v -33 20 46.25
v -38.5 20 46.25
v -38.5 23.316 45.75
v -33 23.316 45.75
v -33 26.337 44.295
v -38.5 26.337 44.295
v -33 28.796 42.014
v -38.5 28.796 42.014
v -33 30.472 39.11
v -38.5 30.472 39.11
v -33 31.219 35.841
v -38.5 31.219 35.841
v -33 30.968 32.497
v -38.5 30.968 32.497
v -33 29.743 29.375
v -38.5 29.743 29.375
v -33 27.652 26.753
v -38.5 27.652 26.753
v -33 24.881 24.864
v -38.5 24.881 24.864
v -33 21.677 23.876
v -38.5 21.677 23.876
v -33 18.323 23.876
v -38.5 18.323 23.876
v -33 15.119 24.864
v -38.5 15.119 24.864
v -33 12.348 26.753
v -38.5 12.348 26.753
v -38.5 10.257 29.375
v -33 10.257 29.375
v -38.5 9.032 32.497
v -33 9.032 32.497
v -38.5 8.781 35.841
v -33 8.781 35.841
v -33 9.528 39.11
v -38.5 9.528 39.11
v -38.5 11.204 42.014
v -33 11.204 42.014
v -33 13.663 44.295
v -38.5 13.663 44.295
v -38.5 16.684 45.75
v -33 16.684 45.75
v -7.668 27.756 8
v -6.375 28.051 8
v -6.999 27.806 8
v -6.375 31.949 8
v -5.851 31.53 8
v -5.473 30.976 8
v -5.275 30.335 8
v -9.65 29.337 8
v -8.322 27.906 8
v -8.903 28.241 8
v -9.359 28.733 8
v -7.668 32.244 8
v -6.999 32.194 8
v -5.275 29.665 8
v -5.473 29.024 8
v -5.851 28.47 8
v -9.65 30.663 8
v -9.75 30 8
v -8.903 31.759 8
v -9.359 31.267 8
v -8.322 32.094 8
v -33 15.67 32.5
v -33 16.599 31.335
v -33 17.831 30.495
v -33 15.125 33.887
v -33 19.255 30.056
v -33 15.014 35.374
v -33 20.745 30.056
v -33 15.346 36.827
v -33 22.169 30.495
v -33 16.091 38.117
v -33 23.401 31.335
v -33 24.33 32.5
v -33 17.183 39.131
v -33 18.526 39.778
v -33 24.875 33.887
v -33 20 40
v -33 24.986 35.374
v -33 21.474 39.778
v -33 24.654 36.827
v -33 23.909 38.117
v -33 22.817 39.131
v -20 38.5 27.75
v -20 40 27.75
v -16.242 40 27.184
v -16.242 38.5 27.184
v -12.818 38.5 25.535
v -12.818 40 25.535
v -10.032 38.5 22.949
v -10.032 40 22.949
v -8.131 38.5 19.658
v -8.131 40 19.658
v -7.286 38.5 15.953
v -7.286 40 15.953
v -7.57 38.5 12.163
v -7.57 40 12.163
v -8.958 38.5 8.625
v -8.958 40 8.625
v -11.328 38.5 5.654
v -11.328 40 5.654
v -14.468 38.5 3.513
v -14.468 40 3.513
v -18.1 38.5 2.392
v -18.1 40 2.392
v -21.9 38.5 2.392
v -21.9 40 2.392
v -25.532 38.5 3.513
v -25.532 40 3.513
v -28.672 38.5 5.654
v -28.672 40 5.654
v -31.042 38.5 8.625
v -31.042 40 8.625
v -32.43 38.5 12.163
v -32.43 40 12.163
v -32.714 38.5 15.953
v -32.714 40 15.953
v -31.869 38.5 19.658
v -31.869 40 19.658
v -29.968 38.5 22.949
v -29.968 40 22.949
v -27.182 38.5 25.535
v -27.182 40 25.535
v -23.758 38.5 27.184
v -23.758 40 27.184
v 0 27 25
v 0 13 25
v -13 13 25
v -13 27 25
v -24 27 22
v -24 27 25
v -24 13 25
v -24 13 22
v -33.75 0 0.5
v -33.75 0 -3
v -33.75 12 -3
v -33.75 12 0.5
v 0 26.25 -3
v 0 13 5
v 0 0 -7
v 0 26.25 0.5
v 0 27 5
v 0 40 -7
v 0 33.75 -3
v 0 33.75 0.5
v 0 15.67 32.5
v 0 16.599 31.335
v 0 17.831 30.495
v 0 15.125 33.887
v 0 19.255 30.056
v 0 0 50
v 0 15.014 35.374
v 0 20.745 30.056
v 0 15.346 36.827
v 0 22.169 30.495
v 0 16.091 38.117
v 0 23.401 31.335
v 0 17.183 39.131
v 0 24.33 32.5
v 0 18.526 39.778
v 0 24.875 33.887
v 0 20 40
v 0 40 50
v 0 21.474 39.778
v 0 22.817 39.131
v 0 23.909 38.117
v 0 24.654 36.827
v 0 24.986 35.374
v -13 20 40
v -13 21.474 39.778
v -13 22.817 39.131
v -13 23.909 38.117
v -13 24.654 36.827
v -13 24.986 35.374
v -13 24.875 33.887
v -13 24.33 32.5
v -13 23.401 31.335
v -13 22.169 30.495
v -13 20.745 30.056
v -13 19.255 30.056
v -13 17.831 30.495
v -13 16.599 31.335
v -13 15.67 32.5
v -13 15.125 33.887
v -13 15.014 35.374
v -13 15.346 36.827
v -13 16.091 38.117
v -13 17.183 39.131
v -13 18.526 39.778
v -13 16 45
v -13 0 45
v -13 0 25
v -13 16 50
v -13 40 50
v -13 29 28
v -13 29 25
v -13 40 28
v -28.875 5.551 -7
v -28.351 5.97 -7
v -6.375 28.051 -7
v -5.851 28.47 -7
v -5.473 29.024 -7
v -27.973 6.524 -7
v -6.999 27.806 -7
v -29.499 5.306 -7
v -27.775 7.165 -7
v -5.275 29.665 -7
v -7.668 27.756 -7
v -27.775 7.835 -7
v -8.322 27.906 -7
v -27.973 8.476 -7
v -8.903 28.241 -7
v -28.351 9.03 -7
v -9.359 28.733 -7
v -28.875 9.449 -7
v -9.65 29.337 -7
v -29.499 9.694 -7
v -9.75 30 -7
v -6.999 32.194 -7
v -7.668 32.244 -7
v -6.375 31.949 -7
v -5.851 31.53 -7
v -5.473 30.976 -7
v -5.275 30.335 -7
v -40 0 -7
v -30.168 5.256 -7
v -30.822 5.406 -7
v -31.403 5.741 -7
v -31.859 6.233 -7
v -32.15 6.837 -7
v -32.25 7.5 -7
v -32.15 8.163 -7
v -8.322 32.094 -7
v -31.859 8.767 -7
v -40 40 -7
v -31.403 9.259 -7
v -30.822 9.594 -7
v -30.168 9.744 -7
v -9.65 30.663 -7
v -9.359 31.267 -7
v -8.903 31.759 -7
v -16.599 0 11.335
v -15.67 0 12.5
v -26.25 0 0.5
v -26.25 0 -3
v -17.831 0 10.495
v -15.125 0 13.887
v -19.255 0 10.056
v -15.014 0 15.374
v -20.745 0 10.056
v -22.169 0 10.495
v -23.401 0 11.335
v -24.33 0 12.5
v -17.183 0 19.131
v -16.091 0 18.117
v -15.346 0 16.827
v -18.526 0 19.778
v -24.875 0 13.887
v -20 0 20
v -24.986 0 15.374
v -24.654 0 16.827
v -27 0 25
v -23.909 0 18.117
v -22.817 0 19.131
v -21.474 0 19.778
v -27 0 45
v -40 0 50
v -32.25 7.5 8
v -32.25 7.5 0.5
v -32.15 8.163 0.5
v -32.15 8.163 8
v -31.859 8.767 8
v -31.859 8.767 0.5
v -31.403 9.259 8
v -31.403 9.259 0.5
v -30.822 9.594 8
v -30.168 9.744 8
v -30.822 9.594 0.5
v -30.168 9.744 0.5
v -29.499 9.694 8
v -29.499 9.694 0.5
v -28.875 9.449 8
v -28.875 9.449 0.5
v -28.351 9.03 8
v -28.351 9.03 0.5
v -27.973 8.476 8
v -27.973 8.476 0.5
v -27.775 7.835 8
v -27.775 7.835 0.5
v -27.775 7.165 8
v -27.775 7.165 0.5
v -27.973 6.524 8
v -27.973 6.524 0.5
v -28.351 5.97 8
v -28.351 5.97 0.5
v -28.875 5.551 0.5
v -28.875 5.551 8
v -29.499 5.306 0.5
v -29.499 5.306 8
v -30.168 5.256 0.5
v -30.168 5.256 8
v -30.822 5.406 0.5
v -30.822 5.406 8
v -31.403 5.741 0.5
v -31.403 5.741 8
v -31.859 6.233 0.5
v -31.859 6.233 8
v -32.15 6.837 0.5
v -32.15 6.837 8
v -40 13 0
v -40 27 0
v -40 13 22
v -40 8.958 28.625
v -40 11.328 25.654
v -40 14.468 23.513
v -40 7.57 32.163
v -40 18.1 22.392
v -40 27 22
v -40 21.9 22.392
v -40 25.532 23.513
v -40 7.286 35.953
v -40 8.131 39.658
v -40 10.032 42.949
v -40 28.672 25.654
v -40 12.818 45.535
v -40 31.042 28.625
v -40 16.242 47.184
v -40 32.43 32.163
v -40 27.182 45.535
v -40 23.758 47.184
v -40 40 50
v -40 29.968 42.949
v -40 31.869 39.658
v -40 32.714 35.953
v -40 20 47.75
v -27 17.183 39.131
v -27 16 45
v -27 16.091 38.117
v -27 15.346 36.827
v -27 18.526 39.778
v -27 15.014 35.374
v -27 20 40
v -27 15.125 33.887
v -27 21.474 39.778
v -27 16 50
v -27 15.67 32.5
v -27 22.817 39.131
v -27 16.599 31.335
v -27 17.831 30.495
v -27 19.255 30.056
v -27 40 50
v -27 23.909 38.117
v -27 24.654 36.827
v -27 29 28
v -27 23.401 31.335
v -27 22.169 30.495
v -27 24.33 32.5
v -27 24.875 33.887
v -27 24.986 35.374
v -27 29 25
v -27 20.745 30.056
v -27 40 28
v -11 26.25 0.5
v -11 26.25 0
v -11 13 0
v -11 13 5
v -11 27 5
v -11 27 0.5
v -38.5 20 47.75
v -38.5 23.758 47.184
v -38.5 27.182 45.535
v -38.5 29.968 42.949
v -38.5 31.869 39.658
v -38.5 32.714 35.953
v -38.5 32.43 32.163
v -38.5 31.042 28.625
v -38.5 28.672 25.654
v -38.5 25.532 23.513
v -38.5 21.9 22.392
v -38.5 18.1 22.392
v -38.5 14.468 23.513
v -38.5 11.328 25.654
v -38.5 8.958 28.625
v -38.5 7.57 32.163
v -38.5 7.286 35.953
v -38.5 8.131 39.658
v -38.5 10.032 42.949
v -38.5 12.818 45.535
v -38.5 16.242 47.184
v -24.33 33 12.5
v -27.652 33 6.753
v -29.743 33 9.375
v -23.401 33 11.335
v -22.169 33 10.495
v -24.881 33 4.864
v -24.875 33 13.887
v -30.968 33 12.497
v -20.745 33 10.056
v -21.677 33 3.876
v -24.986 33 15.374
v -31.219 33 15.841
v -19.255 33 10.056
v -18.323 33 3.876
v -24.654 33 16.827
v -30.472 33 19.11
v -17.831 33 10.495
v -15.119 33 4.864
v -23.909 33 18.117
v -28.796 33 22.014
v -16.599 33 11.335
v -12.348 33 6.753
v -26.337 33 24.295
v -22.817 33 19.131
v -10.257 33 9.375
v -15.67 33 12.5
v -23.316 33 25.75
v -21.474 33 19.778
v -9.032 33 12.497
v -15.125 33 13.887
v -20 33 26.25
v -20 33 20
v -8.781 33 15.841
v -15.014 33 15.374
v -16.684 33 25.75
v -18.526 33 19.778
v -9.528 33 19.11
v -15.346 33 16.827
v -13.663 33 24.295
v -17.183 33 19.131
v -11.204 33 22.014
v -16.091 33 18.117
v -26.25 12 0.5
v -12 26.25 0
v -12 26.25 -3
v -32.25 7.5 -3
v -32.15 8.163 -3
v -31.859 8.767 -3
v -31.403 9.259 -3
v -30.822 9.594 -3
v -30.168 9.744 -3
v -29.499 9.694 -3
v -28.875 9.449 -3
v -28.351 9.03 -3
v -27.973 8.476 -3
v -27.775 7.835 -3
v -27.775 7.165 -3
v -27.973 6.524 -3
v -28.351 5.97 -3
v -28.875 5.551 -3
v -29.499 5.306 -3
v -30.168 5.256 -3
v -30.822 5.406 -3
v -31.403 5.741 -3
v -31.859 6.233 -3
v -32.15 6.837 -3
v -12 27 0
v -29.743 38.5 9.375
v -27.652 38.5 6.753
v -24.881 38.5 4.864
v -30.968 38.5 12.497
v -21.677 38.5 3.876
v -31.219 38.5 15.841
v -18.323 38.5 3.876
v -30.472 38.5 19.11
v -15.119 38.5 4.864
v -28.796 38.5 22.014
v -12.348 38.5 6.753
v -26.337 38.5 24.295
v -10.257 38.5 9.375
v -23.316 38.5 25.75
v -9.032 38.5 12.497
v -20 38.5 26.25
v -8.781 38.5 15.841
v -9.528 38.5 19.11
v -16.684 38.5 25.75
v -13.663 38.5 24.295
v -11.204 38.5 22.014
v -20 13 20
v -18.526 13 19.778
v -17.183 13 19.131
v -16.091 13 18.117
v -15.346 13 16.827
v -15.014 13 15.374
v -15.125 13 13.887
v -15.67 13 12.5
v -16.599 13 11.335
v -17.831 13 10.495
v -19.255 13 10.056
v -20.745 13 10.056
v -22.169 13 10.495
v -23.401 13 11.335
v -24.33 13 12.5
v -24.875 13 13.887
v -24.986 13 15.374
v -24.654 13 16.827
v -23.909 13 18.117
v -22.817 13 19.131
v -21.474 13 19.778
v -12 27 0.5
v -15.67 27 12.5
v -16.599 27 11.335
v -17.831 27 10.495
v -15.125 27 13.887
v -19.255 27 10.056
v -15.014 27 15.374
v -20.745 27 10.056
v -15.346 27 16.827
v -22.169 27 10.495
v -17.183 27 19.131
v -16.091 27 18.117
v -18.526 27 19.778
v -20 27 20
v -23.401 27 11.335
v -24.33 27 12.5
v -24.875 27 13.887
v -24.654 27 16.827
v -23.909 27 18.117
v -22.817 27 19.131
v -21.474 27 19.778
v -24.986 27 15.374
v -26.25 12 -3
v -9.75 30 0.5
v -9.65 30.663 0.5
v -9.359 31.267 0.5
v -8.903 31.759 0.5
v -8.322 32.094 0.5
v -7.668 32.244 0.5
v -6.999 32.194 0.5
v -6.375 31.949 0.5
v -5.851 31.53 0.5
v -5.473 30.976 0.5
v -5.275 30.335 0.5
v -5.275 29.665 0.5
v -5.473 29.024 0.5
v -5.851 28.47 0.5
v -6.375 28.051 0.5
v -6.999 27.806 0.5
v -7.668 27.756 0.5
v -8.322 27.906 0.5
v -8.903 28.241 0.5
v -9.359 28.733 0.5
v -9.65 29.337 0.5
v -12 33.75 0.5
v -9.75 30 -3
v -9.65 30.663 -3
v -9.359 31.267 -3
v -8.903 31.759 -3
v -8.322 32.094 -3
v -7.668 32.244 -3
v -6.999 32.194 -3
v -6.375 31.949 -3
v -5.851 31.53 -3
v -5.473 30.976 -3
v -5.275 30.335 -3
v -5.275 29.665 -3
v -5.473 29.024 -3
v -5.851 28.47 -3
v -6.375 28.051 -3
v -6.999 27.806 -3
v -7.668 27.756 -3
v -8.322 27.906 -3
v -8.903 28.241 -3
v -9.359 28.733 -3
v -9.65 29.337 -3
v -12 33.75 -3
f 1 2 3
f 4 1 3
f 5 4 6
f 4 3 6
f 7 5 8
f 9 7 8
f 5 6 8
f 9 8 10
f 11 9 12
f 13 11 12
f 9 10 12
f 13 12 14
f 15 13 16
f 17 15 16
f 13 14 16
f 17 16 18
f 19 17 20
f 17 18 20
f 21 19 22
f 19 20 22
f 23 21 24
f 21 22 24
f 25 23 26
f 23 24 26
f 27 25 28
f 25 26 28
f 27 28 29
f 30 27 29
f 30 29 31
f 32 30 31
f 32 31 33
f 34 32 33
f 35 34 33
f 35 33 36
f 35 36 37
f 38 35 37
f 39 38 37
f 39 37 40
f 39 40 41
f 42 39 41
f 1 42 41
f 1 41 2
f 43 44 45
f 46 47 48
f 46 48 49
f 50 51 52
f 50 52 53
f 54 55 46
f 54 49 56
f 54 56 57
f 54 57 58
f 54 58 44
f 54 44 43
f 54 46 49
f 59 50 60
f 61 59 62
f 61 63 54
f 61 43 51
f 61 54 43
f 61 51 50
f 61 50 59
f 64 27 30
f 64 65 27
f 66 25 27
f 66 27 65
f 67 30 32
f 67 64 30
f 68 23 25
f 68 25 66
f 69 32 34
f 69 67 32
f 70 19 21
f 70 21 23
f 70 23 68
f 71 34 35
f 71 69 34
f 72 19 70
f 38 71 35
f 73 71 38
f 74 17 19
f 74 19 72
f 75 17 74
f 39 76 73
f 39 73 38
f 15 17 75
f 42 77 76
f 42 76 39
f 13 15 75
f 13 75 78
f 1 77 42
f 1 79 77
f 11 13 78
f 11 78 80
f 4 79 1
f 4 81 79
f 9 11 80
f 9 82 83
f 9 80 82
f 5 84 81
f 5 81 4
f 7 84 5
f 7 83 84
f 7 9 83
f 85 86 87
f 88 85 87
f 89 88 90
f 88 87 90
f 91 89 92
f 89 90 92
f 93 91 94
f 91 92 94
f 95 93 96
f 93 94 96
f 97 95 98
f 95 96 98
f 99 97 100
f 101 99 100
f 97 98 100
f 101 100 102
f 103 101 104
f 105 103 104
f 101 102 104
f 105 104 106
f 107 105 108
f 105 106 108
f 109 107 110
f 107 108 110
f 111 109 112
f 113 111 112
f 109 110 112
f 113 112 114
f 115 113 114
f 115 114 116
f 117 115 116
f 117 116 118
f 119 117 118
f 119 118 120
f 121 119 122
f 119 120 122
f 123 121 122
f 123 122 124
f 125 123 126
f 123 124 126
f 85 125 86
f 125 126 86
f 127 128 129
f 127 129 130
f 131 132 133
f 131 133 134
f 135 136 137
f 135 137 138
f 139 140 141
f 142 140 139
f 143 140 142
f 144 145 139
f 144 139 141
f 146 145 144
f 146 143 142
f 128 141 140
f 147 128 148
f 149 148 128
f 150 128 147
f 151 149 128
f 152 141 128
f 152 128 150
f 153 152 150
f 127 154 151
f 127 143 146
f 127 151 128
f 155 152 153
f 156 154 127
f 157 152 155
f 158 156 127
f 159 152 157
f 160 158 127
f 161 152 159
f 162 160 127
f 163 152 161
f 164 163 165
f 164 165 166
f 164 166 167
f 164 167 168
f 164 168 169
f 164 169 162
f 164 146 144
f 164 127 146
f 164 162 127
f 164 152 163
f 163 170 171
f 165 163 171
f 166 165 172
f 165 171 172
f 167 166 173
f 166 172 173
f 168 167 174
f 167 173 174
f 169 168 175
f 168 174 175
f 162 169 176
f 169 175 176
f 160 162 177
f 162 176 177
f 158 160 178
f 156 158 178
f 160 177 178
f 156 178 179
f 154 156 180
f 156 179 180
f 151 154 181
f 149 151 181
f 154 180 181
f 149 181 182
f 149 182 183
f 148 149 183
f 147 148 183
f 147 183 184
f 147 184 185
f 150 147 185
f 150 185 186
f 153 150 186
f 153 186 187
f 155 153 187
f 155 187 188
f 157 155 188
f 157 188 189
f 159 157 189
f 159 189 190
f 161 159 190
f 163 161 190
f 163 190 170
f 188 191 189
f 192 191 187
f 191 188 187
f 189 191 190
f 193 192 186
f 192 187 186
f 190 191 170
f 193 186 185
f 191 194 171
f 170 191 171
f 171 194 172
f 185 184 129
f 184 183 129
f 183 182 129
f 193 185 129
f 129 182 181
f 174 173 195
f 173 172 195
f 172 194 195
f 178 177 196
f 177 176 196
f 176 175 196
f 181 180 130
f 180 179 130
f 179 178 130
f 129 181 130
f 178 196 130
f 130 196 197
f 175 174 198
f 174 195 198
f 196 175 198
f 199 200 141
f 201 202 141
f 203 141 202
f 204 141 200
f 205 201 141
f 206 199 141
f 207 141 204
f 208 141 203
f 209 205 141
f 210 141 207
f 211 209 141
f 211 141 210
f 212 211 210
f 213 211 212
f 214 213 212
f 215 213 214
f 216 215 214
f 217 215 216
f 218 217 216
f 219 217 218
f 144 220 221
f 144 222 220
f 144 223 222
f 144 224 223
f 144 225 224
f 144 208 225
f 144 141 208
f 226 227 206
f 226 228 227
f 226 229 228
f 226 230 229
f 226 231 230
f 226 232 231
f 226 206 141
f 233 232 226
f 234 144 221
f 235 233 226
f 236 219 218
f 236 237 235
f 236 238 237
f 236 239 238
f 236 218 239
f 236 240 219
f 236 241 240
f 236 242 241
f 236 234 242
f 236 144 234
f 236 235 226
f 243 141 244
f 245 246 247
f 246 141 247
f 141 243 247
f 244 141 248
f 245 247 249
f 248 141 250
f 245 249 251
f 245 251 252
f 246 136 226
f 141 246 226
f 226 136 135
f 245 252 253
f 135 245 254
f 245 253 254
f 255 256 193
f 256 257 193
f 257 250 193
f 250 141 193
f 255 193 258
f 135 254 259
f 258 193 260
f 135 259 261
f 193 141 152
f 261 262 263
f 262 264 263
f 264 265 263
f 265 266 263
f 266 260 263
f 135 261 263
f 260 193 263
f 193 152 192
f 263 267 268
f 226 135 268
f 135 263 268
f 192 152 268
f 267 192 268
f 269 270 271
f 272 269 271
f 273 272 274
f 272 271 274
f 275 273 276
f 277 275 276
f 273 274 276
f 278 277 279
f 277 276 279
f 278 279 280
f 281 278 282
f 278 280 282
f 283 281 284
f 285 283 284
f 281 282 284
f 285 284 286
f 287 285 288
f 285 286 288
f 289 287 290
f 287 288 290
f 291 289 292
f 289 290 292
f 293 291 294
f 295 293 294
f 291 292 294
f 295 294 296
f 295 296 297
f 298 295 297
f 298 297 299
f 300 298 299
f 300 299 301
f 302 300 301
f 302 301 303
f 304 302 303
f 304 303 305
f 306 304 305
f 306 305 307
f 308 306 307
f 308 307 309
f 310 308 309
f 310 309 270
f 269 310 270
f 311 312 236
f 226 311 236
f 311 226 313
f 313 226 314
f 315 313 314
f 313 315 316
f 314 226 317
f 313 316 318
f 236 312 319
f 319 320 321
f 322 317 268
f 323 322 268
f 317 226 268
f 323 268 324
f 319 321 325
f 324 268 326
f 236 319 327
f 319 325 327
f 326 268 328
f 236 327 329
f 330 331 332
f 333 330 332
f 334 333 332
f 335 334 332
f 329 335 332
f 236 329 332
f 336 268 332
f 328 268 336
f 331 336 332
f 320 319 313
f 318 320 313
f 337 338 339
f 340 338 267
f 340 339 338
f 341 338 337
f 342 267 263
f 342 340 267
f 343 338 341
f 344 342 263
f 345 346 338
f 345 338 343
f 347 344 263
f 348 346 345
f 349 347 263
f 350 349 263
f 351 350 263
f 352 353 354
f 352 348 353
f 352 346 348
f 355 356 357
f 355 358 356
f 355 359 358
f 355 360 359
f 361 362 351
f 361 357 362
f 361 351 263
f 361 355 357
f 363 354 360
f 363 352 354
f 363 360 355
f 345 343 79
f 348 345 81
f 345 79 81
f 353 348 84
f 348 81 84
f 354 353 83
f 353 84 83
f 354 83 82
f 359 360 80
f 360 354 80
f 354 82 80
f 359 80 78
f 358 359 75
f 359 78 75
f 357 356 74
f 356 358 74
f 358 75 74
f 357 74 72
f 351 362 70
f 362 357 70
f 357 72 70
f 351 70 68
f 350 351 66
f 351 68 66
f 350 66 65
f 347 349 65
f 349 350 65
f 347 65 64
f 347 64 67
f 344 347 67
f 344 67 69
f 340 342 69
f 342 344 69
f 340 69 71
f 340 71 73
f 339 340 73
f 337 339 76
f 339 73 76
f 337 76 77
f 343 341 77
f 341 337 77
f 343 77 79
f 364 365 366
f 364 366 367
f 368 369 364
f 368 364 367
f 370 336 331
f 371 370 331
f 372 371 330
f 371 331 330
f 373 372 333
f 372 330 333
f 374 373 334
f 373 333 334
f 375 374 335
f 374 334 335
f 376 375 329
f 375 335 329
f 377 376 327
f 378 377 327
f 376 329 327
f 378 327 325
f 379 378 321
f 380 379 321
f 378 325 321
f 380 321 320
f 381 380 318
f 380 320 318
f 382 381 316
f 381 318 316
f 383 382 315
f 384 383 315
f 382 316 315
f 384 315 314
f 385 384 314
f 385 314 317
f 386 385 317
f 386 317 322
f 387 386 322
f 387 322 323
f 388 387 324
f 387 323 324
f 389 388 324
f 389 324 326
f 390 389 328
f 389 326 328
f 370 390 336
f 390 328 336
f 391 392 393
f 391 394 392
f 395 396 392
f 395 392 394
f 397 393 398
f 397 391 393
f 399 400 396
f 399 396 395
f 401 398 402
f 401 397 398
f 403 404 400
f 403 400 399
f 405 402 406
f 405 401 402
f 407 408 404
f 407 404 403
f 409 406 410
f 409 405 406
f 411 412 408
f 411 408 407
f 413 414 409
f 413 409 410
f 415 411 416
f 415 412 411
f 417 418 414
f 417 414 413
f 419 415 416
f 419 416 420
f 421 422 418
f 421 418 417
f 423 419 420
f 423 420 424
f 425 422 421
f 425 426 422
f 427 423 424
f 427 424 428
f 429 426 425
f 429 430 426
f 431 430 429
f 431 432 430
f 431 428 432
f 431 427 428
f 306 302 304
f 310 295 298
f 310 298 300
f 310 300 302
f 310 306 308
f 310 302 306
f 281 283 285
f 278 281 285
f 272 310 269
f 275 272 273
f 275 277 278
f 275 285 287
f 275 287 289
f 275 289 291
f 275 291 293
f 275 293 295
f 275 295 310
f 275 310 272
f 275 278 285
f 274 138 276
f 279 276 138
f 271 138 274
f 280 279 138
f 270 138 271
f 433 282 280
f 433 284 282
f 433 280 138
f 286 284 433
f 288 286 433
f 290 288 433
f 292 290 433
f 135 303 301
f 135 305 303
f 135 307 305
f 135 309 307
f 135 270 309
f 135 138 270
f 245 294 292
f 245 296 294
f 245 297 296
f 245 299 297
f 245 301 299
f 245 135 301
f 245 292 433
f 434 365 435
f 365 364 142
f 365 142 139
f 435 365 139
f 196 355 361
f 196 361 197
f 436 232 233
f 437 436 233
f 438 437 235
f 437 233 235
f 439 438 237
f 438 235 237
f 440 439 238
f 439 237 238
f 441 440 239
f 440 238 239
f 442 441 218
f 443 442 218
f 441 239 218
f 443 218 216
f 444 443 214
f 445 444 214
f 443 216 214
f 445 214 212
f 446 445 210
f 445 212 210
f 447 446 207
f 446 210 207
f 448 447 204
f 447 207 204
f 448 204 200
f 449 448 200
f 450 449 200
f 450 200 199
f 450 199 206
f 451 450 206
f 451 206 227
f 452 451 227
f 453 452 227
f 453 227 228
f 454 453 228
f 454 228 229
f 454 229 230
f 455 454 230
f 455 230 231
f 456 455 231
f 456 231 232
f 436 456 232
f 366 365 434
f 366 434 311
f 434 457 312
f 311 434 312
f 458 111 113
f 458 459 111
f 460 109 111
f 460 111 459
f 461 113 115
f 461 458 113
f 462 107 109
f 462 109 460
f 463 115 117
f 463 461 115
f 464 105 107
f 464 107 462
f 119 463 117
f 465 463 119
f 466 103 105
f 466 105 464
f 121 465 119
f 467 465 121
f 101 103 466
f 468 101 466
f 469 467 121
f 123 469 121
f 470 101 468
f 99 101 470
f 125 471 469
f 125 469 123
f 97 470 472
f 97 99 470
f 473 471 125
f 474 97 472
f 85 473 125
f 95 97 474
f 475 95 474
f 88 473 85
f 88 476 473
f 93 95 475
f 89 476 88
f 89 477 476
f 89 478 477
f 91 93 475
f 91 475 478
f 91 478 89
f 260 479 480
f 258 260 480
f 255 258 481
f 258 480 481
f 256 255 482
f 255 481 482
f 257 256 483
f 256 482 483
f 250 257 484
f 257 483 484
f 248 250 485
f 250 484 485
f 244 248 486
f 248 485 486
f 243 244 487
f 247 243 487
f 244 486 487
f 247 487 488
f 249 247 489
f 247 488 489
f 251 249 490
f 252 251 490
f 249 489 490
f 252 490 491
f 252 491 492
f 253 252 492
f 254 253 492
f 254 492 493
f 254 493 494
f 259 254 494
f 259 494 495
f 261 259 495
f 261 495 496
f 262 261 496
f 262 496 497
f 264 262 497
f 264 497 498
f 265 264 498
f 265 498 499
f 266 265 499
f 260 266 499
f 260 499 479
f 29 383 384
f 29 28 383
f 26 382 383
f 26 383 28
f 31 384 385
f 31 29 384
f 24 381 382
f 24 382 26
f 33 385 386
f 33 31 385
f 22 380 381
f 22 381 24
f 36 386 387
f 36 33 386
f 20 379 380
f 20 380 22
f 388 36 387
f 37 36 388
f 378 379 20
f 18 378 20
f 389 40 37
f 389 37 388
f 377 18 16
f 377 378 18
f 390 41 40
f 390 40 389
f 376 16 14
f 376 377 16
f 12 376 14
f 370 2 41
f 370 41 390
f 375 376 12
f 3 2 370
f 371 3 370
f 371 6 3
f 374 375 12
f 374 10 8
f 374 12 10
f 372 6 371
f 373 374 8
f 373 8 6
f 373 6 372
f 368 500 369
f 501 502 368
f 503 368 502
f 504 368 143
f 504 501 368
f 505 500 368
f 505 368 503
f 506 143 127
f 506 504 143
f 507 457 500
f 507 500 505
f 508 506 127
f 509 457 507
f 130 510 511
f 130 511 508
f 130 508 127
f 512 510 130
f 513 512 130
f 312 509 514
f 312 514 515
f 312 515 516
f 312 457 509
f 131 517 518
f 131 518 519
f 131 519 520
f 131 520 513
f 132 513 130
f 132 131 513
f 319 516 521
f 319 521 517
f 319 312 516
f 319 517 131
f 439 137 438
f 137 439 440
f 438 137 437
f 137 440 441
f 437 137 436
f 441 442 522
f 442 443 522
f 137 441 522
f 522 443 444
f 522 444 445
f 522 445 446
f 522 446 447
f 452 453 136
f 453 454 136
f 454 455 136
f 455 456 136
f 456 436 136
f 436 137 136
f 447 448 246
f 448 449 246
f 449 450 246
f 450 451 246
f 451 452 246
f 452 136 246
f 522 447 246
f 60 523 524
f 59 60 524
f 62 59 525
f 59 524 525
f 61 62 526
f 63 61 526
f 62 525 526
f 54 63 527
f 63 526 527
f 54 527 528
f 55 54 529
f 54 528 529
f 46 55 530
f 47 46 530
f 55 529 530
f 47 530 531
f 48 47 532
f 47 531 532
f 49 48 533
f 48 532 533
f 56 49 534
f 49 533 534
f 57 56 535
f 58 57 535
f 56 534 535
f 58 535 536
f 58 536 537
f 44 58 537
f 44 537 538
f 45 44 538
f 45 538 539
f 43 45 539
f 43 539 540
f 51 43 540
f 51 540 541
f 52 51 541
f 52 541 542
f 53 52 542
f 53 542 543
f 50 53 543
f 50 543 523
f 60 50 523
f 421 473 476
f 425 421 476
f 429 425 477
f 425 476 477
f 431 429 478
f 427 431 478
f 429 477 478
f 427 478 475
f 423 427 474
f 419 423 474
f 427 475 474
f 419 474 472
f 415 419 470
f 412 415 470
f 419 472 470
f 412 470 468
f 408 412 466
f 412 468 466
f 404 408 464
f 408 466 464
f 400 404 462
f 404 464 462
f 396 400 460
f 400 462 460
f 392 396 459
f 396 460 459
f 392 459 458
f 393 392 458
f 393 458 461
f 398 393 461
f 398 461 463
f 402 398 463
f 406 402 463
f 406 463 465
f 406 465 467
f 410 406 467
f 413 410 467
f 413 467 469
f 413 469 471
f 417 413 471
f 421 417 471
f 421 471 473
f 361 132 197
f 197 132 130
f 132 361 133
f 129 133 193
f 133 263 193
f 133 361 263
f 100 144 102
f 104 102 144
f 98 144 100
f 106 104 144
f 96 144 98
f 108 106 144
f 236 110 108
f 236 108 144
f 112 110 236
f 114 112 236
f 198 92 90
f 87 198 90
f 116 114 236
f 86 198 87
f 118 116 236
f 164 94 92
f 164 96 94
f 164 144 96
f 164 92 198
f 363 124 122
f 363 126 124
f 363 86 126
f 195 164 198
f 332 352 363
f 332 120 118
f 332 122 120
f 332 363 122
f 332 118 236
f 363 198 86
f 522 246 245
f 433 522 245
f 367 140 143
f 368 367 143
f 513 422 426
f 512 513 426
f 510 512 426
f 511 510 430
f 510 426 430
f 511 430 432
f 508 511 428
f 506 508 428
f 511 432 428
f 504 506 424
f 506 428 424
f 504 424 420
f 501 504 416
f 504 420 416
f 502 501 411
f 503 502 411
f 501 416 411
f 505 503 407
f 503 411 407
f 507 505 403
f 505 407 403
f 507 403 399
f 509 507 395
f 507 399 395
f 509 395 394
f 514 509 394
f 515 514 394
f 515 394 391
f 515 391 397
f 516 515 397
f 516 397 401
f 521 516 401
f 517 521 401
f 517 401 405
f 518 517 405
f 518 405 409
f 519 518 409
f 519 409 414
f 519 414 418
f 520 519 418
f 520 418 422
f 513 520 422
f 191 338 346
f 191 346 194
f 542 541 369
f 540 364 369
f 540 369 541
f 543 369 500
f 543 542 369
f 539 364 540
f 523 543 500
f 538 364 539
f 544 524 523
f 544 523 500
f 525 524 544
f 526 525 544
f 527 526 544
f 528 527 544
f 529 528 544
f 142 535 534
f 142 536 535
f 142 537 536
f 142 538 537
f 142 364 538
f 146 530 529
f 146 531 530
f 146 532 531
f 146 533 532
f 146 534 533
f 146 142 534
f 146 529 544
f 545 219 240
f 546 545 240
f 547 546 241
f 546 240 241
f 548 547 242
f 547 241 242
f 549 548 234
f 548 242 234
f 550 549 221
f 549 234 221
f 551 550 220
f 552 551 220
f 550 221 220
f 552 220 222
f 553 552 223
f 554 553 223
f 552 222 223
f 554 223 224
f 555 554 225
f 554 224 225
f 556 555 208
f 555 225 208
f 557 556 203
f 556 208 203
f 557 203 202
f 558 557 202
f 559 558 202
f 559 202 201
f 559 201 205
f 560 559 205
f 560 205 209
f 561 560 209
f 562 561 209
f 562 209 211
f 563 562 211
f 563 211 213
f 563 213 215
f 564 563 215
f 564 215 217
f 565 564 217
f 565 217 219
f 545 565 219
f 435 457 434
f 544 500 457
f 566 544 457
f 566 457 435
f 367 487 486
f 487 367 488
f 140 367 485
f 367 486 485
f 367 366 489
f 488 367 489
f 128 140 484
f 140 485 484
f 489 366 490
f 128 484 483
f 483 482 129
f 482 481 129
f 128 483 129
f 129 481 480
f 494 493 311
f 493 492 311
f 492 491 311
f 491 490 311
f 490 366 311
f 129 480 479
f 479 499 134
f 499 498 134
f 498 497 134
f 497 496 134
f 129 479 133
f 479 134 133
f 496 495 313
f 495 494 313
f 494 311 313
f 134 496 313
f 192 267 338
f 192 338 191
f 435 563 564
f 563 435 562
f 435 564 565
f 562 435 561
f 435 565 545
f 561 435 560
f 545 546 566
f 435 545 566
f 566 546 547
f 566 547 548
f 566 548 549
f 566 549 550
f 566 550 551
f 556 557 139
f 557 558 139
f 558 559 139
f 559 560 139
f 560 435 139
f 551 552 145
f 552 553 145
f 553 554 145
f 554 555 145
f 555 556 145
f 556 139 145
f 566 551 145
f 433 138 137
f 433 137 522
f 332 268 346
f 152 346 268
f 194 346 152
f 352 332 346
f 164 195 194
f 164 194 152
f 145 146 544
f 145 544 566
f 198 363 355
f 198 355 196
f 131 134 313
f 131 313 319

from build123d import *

# Parameters (mm, degrees)
ESQUISSE1_W              = 40
ESQUISSE1_H              = 40
BOSS_EXTRU_1_DEPTH       = 50
ESQUISSE2_R              = 5
ENL_V_MAT_EXTRU_1_DEPTH  = 41
ESQUISSE3_R              = 5
ENL_V_MAT_EXTRU_2_DEPTH  = 41
ESQUISSE4_W              = 22
ESQUISSE4_H              = 14
ENL_V_MAT_EXTRU_3_DEPTH  = 29
ESQUISSE5_W              = 14
ESQUISSE5_H              = 20
ENL_V_MAT_EXTRU_4_DEPTH  = 29
ESQUISSE6_W              = 20
ESQUISSE6_H              = 14
ENL_V_MAT_EXTRU_5_DEPTH  = 24
ESQUISSE7_W              = 14
ESQUISSE7_H              = 22
ENL_V_MAT_EXTRU_6_DEPTH  = 24
ESQUISSE10_R             = 11.25
ENL_V_MAT_EXTRU_9_DEPTH  = 7
ESQUISSE11_R             = 12.75
ENL_V_MAT_EXTRU_10_DEPTH = 1.5
ESQUISSE14_R             = 11.25
ENL_V_MAT_EXTRU_11_DEPTH = 7
ESQUISSE15_R             = 12.75
ENL_V_MAT_EXTRU_12_DEPTH = 1.5
ESQUISSE16_W             = 40
ESQUISSE16_H             = 40
BOSS_EXTRU_2_DEPTH       = 7
ESQUISSE17_R             = 2.25
ENL_V_MAT_EXTRU_13_DEPTH = 15
ESQUISSE18_W             = 3.5
ESQUISSE18_H             = 7.5
ENL_V_MAT_EXTRU_14_DEPTH = 12
ESQUISSE19_W             = 7.5
ESQUISSE19_H             = 3.5
ENL_V_MAT_EXTRU_15_DEPTH = 12


with BuildPart() as part:
    # Esquisse1 → Boss.-Extru.1 (new body)
    with BuildSketch(Plane.XY):
        with Locations((-20, 20)):
            Rectangle(ESQUISSE1_W, ESQUISSE1_H)
    extrude(amount=BOSS_EXTRU_1_DEPTH)

    # Esquisse2 → Enlèv. mat.-Extru.1 (cut, through all)
    with BuildSketch(Plane(origin=(0, 40, 0), x_dir=(1, 0, 0), z_dir=(0, 1, 0))):
        with Locations(Location((-20, -15, 0), (0, 0, 270))):  # turned: the seam where the file's is
            Circle(ESQUISSE2_R)
    extrude(amount=-ENL_V_MAT_EXTRU_1_DEPTH, mode=Mode.SUBTRACT)

    # Esquisse3 → Enlèv. mat.-Extru.2 (cut, through all)
    with BuildSketch(Plane.ZY.offset(40)):
        with Locations((35, 20)):
            Circle(ESQUISSE3_R)
    extrude(amount=-ENL_V_MAT_EXTRU_2_DEPTH, mode=Mode.SUBTRACT)

    # Esquisse4 → Enlèv. mat.-Extru.3 (cut)
    with BuildSketch(Plane.ZY.offset(40)):
        with Locations((11, 20)):
            Rectangle(ESQUISSE4_W, ESQUISSE4_H)
    extrude(amount=-ENL_V_MAT_EXTRU_3_DEPTH, mode=Mode.SUBTRACT)

    # Esquisse5 → Enlèv. mat.-Extru.4 (cut)
    with BuildSketch(Plane.XZ):
        with Locations((-20, 35)):
            Rectangle(ESQUISSE5_W, ESQUISSE5_H)
    extrude(amount=-ENL_V_MAT_EXTRU_4_DEPTH, mode=Mode.SUBTRACT)

    # Esquisse6 → Enlèv. mat.-Extru.5 (cut)
    with BuildSketch(Plane(origin=(0, 0, 0), x_dir=(0, 0, -1), z_dir=(1, 0, 0))):
        with Locations((-15, 20)):
            Rectangle(ESQUISSE6_W, ESQUISSE6_H)
    extrude(amount=-ENL_V_MAT_EXTRU_5_DEPTH, mode=Mode.SUBTRACT)

    # Esquisse7 → Enlèv. mat.-Extru.6 (cut)
    with BuildSketch(Plane(origin=(0, 40, 0), x_dir=(1, 0, 0), z_dir=(0, 1, 0))):
        with Locations((-20, -39)):
            Rectangle(ESQUISSE7_W, ESQUISSE7_H)
    extrude(amount=-ENL_V_MAT_EXTRU_6_DEPTH, mode=Mode.SUBTRACT)

    # Esquisse10 → Enlèv. mat.-Extru.9 (cut)
    with BuildSketch(Plane(origin=(0, 40, 0), x_dir=(1, 0, 0), z_dir=(0, 1, 0))):
        with Locations(Location((-20, -15, 0), (0, 0, 270))):  # turned: the seam where the file's is
            Circle(ESQUISSE10_R)
    extrude(amount=-ENL_V_MAT_EXTRU_9_DEPTH, mode=Mode.SUBTRACT)

    # Esquisse11 → Enlèv. mat.-Extru.10 (cut)
    with BuildSketch(Plane(origin=(0, 40, 0), x_dir=(1, 0, 0), z_dir=(0, 1, 0))):
        with Locations(Location((-20, -15, 0), (0, 0, 270))):  # turned: the seam where the file's is
            Circle(ESQUISSE11_R)
    extrude(amount=-ENL_V_MAT_EXTRU_10_DEPTH, mode=Mode.SUBTRACT)

    # Esquisse14 → Enlèv. mat.-Extru.11 (cut)
    with BuildSketch(Plane.ZY.offset(40)):
        with Locations((35, 20)):
            Circle(ESQUISSE14_R)
    extrude(amount=-ENL_V_MAT_EXTRU_11_DEPTH, mode=Mode.SUBTRACT)

    # Esquisse15 → Enlèv. mat.-Extru.12 (cut)
    with BuildSketch(Plane.ZY.offset(40)):
        with Locations((35, 20)):
            Circle(ESQUISSE15_R)
    extrude(amount=-ENL_V_MAT_EXTRU_12_DEPTH, mode=Mode.SUBTRACT)

    # Esquisse16 → Boss.-Extru.2 (add)
    with BuildSketch(Plane(origin=(0, 0, 0), x_dir=(-1, 0, 0), z_dir=(0, 0, -1))):
        with Locations((20, 20)):
            Rectangle(ESQUISSE16_W, ESQUISSE16_H)
    extrude(amount=BOSS_EXTRU_2_DEPTH)

    # Esquisse17 → Enlèv. mat.-Extru.13 (cut)
    with BuildSketch(Plane(origin=(0, 0, -7), x_dir=(-1, 0, 0), z_dir=(0, 0, -1))):
        with Locations((7.5, 30)):
            Circle(ESQUISSE17_R)
        with Locations((30, 7.5)):
            Circle(ESQUISSE17_R)
    extrude(amount=-ENL_V_MAT_EXTRU_13_DEPTH, mode=Mode.SUBTRACT)

    # Esquisse18 → Enlèv. mat.-Extru.14 (cut)
    with BuildSketch(Plane(origin=(0, 0, 0), x_dir=(0, 0, -1), z_dir=(1, 0, 0))):
        with Locations((1.25, 30)):
            Rectangle(ESQUISSE18_W, ESQUISSE18_H)
    extrude(amount=-ENL_V_MAT_EXTRU_14_DEPTH, mode=Mode.SUBTRACT)

    # Esquisse19 → Enlèv. mat.-Extru.15 (cut)
    with BuildSketch(Plane.XZ):
        with Locations((-30, -1.25)):
            Rectangle(ESQUISSE19_W, ESQUISSE19_H)
    extrude(amount=-ENL_V_MAT_EXTRU_15_DEPTH, mode=Mode.SUBTRACT)


solid = part.part
